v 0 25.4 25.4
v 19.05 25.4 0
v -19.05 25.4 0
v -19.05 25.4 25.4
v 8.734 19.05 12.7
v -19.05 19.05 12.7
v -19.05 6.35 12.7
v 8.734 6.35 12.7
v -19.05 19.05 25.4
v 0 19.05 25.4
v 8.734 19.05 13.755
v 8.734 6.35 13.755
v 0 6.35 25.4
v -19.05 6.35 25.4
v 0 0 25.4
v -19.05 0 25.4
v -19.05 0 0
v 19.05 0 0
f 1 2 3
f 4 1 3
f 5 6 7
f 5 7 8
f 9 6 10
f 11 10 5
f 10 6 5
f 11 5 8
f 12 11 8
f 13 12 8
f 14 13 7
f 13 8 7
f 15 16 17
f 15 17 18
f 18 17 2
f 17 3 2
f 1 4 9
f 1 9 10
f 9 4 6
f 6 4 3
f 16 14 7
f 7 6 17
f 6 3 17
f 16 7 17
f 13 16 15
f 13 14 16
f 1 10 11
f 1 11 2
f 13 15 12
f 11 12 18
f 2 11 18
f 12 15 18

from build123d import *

# Parameters (mm, degrees)
F0_W     = 19.05
F0_H     = 6.35
F1_DEPTH = 25.4
F2_DEPTH = 12.7
F4_DEPTH = 25.4


with BuildPart() as f1:
    # F0 (on Top) → F1 (new body)
    with BuildSketch(Plane.XY):
        Polygon((19.05, 25.4), (0, 25.4), (0, 19.05), (8.733842, 19.05), (8.733842, 6.35), (0, 6.35), (0, 0), (19.05, 0), align=None)
        with Locations((-9.525, 3.175)):
            Rectangle(F0_W, F0_H)
        with Locations((-9.525, 22.225)):
            Rectangle(F0_W, F0_H)
    extrude(amount=F1_DEPTH)

    # F0 (on Top) → F2 (join)
    with BuildSketch(Plane.XY):
        Polygon((0, 19.05), (-19.05, 19.05), (-19.05, 6.35), (0, 6.35), (8.733842, 6.35), (8.733842, 19.05), align=None)
    extrude(amount=F2_DEPTH)

    # F3 (on face) → F4 (cut)
    with BuildSketch(Plane.XZ):
        Polygon((19.05, 25.4), (0, 25.4), (19.05, 0), align=None)
    extrude(amount=-F4_DEPTH, mode=Mode.SUBTRACT)


solid = f1.part
